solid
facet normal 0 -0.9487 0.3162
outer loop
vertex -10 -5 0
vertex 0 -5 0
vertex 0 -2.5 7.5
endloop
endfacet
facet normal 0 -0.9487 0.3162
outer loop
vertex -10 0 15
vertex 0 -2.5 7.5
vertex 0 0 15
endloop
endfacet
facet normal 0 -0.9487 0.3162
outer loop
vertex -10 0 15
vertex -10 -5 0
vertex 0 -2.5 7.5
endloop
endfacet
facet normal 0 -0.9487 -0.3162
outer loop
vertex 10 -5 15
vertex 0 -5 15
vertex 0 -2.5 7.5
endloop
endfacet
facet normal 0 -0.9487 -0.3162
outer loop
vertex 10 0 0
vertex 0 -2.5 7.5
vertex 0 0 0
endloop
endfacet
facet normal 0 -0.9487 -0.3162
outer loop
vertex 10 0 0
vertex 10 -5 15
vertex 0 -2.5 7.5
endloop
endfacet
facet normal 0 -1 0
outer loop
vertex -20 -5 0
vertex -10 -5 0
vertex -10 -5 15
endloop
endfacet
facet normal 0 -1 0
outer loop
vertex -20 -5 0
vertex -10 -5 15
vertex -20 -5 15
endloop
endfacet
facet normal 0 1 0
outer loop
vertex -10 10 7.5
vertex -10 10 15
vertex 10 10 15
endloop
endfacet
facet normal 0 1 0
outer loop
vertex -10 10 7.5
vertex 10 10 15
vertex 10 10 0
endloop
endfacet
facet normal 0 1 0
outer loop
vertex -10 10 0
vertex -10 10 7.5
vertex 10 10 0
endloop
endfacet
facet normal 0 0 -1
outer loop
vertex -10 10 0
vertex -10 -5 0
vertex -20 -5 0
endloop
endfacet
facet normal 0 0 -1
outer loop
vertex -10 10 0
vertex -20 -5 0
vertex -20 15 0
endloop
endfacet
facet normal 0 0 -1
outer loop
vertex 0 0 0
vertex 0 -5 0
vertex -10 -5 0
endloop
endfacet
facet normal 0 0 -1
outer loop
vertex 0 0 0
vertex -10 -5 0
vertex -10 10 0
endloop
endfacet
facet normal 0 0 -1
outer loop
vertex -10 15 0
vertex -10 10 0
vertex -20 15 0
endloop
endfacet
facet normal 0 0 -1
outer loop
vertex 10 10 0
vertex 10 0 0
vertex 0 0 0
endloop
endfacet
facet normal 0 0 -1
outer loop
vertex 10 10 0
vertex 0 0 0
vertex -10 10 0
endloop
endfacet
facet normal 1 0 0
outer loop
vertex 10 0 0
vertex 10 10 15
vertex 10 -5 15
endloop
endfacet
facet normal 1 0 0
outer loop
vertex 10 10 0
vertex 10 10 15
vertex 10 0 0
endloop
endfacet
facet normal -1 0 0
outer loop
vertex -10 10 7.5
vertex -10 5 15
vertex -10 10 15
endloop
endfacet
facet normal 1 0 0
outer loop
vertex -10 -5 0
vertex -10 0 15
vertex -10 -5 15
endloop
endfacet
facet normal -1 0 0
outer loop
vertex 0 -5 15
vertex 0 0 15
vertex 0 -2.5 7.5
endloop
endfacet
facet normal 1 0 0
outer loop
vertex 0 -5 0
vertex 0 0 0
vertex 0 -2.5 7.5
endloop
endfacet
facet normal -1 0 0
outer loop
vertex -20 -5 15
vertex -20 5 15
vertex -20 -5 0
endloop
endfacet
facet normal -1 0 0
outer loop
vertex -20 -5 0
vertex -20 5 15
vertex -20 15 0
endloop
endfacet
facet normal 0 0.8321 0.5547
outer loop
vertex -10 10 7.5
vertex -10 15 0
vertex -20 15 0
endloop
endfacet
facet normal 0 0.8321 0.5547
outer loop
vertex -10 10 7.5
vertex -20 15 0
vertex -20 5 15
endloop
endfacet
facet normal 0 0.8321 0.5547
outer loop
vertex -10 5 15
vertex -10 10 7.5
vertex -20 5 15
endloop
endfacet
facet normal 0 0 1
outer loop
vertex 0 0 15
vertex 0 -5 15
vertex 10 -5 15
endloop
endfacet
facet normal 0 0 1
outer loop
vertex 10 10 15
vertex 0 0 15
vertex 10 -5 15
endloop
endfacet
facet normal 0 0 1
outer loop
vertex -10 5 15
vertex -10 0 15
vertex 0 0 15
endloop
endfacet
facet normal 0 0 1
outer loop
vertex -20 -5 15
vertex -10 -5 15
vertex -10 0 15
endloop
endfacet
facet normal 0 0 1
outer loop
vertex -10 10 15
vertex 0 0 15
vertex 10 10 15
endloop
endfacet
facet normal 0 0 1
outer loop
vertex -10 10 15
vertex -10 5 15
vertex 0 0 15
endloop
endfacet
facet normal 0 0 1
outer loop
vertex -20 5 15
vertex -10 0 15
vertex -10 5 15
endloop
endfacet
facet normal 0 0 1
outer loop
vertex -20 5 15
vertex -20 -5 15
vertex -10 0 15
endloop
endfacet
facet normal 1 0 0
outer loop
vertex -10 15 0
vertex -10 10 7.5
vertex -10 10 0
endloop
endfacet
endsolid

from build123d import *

# Parameters (mm, degrees)
BOSS_EXTRUDE1_DEPTH  = 15
BOSS_EXTRUDE8_DEPTH  = 10
SKETCH5_W            = 15
SKETCH5_H            = 15
BOSS_EXTRUDE10_DEPTH = 10
CUT_EXTRUDE4_DEPTH   = 10
BOSS_EXTRUDE11_DEPTH = 10


with BuildPart() as part:
    # Sketch1 → Boss-Extrude1 (new body)
    with BuildSketch(Plane.XY):
        Polygon((-20, -5), (-20, 5), (-10, 5), (-10, 10), (0, 10), (0, 0), (-10, 0), (-10, -5), align=None)
    extrude(amount=BOSS_EXTRUDE1_DEPTH)

    # Sketch2 → Boss-Extrude8 (add)
    with BuildSketch(Plane(origin=(-10, 0, 0), x_dir=(0, 0, -1), z_dir=(1, 0, 0))):
        Polygon((0, 0), (0, -5), (-15, 0), align=None)
    extrude(amount=BOSS_EXTRUDE8_DEPTH)

    # Sketch5 → Boss-Extrude10 (add)
    with BuildSketch(Plane(origin=(0, 0, 0), x_dir=(0, 0, -1), z_dir=(1, 0, 0))):
        with Locations((-7.5, 2.5)):
            Rectangle(SKETCH5_W, SKETCH5_H)
    extrude(amount=BOSS_EXTRUDE10_DEPTH)

    # Sketch6 → Cut-Extrude4 (cut)
    with BuildSketch(Plane(origin=(10, 0, 0), x_dir=(0, 0, -1), z_dir=(1, 0, 0))):
        Polygon((-15, -5), (0, 0), (0, -5), align=None)
    extrude(amount=-CUT_EXTRUDE4_DEPTH, mode=Mode.SUBTRACT)

    # Sketch7 → Boss-Extrude11 (add)
    with BuildSketch(Plane.ZY.offset(10)):
        Polygon((0, 5), (0, 15), (15, 5), align=None)
    extrude(amount=BOSS_EXTRUDE11_DEPTH)


solid = part.part
